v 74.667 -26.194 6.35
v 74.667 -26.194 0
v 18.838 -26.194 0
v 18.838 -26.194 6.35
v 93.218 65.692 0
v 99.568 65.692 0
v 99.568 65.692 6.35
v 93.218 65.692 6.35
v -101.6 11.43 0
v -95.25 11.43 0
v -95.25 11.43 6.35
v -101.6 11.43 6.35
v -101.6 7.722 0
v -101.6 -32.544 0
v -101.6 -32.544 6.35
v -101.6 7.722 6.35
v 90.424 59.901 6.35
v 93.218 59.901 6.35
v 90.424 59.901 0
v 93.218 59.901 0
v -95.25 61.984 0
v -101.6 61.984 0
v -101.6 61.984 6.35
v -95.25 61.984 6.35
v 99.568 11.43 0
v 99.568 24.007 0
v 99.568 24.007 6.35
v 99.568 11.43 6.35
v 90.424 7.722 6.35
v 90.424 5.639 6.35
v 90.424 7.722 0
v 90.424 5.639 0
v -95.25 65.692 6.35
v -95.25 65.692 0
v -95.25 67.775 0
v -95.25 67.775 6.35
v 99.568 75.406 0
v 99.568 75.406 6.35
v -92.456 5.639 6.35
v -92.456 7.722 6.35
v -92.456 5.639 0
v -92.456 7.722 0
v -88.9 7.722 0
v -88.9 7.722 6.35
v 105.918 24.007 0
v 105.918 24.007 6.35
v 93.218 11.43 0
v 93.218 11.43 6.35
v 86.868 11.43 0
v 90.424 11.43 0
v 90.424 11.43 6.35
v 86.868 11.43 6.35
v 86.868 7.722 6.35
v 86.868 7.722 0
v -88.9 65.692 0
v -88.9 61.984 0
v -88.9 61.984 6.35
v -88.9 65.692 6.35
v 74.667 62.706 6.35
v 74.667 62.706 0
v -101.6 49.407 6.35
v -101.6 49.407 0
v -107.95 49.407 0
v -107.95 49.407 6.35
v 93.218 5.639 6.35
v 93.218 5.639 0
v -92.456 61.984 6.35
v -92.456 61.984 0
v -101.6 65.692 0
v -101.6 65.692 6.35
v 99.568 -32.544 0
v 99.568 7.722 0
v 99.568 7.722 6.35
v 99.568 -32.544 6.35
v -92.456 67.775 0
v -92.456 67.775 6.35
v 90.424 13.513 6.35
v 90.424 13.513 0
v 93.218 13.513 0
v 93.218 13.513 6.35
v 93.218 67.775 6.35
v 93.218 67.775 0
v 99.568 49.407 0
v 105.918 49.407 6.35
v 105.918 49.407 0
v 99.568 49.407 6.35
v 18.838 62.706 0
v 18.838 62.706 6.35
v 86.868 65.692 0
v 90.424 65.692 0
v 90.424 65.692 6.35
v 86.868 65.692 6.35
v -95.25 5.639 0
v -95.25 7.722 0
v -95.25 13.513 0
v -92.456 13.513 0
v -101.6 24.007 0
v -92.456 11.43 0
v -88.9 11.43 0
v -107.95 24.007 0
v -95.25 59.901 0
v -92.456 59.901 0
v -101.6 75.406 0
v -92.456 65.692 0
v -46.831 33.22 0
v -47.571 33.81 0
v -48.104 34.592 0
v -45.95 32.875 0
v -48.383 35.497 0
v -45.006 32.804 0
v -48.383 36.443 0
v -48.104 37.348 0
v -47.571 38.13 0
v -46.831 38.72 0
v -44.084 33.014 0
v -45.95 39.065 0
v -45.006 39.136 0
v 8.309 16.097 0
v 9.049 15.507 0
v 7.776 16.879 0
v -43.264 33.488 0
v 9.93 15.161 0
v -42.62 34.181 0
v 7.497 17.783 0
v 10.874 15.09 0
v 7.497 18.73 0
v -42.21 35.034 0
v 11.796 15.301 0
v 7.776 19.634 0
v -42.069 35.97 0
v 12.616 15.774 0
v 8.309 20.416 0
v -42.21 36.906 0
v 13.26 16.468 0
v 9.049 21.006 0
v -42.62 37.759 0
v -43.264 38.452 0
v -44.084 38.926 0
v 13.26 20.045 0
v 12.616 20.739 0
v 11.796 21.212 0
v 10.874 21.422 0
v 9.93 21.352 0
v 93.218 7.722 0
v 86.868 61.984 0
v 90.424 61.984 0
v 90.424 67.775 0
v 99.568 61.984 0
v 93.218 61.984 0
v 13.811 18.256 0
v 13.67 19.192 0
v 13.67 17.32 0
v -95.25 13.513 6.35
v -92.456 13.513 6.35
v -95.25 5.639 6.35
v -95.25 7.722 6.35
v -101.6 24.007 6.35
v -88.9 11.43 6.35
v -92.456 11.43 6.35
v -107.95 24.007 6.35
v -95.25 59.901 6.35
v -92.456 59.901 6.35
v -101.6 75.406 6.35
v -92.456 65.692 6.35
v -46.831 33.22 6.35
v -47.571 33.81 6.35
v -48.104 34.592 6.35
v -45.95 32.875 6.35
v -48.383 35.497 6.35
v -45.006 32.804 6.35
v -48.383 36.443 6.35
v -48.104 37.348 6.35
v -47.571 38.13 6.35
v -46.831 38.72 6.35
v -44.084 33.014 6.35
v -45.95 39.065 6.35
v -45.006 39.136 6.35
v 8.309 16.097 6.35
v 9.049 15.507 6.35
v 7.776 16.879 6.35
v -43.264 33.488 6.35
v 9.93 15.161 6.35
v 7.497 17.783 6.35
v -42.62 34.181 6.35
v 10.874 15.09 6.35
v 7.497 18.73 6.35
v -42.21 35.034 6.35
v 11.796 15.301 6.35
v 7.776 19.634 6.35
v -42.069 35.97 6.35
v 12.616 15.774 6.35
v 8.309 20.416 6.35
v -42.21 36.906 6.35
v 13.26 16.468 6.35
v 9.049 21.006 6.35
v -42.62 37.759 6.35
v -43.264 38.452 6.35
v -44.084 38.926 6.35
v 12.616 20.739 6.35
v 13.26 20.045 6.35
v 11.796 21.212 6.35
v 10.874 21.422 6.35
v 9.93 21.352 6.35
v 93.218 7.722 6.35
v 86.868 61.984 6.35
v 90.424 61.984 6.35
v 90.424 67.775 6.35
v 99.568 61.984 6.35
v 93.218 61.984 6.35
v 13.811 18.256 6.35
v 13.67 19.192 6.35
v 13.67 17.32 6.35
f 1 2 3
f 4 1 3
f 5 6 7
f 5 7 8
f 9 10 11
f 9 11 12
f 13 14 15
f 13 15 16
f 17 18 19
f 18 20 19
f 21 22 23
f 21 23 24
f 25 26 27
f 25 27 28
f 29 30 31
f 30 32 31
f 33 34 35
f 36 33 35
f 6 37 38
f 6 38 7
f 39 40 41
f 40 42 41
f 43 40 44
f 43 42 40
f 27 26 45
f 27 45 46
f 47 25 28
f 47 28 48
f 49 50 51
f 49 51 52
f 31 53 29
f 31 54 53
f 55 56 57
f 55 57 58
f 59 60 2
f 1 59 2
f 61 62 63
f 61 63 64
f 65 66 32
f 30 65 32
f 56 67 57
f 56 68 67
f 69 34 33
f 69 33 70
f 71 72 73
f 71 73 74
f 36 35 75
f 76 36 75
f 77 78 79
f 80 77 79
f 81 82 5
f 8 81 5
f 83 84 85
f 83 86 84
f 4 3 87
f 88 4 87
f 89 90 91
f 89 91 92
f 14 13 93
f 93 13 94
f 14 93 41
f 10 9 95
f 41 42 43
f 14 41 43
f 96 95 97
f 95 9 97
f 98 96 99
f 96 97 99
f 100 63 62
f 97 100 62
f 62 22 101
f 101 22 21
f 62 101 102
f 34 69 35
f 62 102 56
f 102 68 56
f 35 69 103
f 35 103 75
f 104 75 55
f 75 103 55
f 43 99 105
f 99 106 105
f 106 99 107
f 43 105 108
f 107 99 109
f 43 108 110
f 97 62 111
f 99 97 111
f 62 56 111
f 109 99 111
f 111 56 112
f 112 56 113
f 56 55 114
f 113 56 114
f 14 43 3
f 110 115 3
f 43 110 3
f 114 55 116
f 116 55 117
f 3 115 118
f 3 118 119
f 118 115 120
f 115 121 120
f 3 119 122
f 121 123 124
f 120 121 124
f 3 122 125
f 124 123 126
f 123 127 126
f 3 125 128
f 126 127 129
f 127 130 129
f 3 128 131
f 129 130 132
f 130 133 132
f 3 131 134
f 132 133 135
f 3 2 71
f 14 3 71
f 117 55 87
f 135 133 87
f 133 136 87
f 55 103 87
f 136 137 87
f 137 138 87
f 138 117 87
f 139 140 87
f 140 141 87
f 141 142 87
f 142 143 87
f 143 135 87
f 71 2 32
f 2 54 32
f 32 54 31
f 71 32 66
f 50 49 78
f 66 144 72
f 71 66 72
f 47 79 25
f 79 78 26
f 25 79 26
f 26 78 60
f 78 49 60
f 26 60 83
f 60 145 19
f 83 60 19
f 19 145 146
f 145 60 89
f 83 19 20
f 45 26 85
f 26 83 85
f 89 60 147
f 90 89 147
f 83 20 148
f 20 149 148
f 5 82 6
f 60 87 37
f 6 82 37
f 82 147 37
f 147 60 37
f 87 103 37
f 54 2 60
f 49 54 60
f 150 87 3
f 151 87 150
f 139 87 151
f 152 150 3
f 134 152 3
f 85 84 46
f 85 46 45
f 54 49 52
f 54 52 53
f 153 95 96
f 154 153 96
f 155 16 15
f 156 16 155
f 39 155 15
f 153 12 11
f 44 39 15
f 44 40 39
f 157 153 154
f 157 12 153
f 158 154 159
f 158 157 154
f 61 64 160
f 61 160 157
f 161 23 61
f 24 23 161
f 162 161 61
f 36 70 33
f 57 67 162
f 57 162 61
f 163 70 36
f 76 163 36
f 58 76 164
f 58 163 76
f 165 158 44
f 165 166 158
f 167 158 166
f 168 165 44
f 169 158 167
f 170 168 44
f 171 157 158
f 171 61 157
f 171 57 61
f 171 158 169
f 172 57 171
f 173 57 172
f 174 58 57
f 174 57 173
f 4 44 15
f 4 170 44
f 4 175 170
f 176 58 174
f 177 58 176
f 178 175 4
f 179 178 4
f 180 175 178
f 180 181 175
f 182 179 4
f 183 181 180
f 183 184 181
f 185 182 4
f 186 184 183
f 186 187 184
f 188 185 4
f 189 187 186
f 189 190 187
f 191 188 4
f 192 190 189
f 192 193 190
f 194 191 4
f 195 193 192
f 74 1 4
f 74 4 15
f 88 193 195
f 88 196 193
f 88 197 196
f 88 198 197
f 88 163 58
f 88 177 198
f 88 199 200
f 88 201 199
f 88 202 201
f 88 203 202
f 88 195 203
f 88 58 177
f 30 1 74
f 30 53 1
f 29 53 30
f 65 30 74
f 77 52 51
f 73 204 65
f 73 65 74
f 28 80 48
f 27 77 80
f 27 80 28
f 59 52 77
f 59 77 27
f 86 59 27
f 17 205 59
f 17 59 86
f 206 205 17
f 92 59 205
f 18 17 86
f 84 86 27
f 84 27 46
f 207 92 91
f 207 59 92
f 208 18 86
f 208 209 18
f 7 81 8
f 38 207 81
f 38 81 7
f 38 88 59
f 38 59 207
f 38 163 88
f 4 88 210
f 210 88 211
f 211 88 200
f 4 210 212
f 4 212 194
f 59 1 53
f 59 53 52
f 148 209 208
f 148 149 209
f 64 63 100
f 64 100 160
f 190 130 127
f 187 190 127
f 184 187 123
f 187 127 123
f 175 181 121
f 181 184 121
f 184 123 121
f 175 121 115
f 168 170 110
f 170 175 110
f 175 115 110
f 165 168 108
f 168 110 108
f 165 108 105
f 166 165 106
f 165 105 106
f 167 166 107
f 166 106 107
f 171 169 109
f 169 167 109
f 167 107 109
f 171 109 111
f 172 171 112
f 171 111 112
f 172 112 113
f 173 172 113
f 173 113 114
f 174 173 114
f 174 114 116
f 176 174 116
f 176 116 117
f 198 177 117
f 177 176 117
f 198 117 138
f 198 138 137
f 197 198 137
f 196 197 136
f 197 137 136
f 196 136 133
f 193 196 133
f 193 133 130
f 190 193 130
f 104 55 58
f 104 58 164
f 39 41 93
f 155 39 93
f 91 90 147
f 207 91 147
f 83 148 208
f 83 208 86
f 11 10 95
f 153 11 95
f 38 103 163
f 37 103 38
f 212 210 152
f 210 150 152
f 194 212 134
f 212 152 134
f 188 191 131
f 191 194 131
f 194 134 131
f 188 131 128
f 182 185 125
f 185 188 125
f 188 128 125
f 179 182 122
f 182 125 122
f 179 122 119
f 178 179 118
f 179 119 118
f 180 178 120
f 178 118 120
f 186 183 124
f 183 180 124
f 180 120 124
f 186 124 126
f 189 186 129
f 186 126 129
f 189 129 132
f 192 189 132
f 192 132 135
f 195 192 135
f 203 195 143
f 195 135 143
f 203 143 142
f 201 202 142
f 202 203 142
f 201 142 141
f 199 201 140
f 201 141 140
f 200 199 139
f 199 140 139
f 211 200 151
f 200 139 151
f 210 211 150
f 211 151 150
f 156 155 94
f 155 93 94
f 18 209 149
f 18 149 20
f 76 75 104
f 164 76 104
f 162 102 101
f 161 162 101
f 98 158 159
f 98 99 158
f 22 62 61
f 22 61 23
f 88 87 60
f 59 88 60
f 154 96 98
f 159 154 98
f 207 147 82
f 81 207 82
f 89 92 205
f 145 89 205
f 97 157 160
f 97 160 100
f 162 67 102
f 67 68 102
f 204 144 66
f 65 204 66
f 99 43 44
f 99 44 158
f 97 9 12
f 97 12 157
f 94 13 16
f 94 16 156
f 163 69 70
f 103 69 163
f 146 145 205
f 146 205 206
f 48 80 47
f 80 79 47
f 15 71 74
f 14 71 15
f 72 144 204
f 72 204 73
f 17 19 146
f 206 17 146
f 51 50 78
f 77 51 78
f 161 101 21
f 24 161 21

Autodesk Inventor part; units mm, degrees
ref_plane "YZ Plane" through (0, 0, 0) normal (1, 0, 0) x (0, 1, 0)
ref_plane "XZ Plane" through (0, 0, 0) normal (0, 1, 0) x (-1, 0, 0)
ref_plane "XY Plane" through (0, 0, 0) normal (0, 0, 1) x (1, 0, 0)
sketch "Sketch1" plane through (0, 0, 0) normal (0, 0, 1) x (1, 0, 0)
  circle A0 centre (-45.2437, 35.97) radius 3.175
  circle A1 centre (10.6363, 18.2563) radius 3.175
  line L0 (-71.7503, -2.6941) -> (-71.7503, 45.5566)
  line L1 (69.7183, -2.6941) -> (-71.7503, -2.6941)
  line L2 (69.7183, 45.5566) -> (69.7183, -2.6941)
  line L3 (-71.7503, 45.5566) -> (69.7183, 45.5566)
  line L4 (99.568, 75.4063) -> (99.568, -32.5437)
  line L5 (99.568, -32.5437) -> (-101.6, -32.5438)
  line L6 (-101.6, -32.5438) -> (-101.6, 75.4062)
  line L7 (-101.6, 75.4062) -> (99.568, 75.4063)
  line L8 (18.8383, 62.7063) -> (74.667, 62.7063)
  line L9 (74.667, 62.7063) -> (74.667, -26.1937)
  line L10 (74.667, -26.1937) -> (18.8383, -26.1937)
  line L11 (18.8383, -26.1937) -> (18.8383, 62.7063)
  line L12 (99.568, 21.4313) -> (-101.6, 21.4312) construction
  line L13 (8.6043, 3.175) -> (8.6043, 21.4313) construction
  point P0 (0, 0)
  dimension "d2" = 201.168
  dimension "d3" = 107.95
  dimension "d4" = 107.95
  dimension "d5" = 90
  dimension "d6" = 201.168
  dimension "d7" = 12.7
  dimension "d8" = 88.9
  dimension "d26" = 39.4363
  dimension "d27" = 56.3563
  dimension "d28" = 6.35
extrude "Extrusion1" add sketch "Sketch1" along normal blind 6.35 contours L0 L3 L11 L1 | L4 L5 L6 L7
sketch "Sketch2" plane through (0, 0, 0) normal (0, 0, -1) x (-1, 0, 0)
  line L0 (101.6, -32.5438) -> (101.6, 75.4062) projected
  line L1 (107.95, 65.692) -> (107.95, 61.9836) projected
  line L2 (107.95, 11.4304) -> (107.95, 7.722) projected
  line L3 (101.6, 7.722) -> (107.95, 7.722) construction
  line L4 (101.6, 11.4304) -> (107.95, 11.4304) construction
  line L5 (101.6, 61.9836) -> (107.95, 61.9836) construction
  line L6 (101.6, 65.4439) -> (107.95, 65.4439) construction
  line L7 (101.6, 7.722) -> (88.9, 7.722)
  line L8 (88.9, 7.722) -> (88.9, 11.4304)
  line L9 (88.9, 11.4304) -> (101.6, 11.4304)
  line L10 (101.6, 11.4304) -> (101.6, 7.722)
  line L11 (101.6, 61.9836) -> (88.9, 61.9836)
  line L12 (88.9, 61.9836) -> (88.9, 65.692)
  line L13 (88.9, 65.692) -> (101.6, 65.692)
  line L14 (101.6, 65.692) -> (101.6, 61.9836)
  line L15 (92.456, 5.6392) -> (95.25, 5.6392)
  line L16 (95.25, 5.6392) -> (95.25, 13.5132)
  line L17 (95.25, 13.5132) -> (92.456, 13.5132)
  line L18 (92.456, 13.5132) -> (92.456, 5.6392)
  line L19 (92.456, 59.9008) -> (95.25, 59.9008)
  line L20 (95.25, 59.9008) -> (95.25, 67.7748)
  line L21 (95.25, 67.7748) -> (92.456, 67.7748)
  line L22 (92.456, 67.7748) -> (92.456, 59.9008)
  point P0 (0, 0)
  dimension "d9" = 12.7
  dimension "d10" = 2.794
  dimension "d11" = 7.874
  dimension "d12" = 7.874
  dimension "d13" = 2.794
  dimension "d14" = 2.0828
  dimension "d16" = 2.0828
  dimension "d17" = 2.0828
  dimension "d18" = 6.35
  dimension "d19" = 6.35
extrude "Extrusion2" cut sketch "Sketch2" against normal through all
ref_plane "Work Plane1" through (-1.016, -32.5437, 0) normal (-1, 0, 0) x (0, 0, 1)
mirror "Mirror1" about plane through (-1.016, -32.5437, 0) normal (-1, 0, 0) of "Extrusion2"
sketch "Sketch3" plane through (-101.6, 11.4304, 0) normal (-1, 0, 0) x (0, 0, 1)
  line L0 (0, 0) -> (0, 50.5532) projected
  line L1 (6.35, 0) -> (6.35, 50.5532) projected
  line L2 (6.35, 12.5766) -> (0, 12.5766) projected
  line L3 (0, 37.9766) -> (6.35, 37.9766) projected
  point P0 (0, -11.4304)
extrude "Extrusion3" add sketch "Sketch3" along normal blind 6.35
ref_plane "Work Plane2" through (-1.016, 75.4062, 6.35) normal (1, 0, 0) x (0, 0, -1)
mirror "Mirror2" about plane through (-1.016, 75.4062, 6.35) normal (1, 0, 0) of "Extrusion3"
equation "\"d4\" = d3"
equation "\"d6\" = d2"
equation "\"d13\" = d10"
equation "\"d14\" = d16"
equation "\"d17\" = d14"
equation "\"d19\" = d18"
properties part number "projectorMountingBase_RB01" material "Steel, Wrought"
